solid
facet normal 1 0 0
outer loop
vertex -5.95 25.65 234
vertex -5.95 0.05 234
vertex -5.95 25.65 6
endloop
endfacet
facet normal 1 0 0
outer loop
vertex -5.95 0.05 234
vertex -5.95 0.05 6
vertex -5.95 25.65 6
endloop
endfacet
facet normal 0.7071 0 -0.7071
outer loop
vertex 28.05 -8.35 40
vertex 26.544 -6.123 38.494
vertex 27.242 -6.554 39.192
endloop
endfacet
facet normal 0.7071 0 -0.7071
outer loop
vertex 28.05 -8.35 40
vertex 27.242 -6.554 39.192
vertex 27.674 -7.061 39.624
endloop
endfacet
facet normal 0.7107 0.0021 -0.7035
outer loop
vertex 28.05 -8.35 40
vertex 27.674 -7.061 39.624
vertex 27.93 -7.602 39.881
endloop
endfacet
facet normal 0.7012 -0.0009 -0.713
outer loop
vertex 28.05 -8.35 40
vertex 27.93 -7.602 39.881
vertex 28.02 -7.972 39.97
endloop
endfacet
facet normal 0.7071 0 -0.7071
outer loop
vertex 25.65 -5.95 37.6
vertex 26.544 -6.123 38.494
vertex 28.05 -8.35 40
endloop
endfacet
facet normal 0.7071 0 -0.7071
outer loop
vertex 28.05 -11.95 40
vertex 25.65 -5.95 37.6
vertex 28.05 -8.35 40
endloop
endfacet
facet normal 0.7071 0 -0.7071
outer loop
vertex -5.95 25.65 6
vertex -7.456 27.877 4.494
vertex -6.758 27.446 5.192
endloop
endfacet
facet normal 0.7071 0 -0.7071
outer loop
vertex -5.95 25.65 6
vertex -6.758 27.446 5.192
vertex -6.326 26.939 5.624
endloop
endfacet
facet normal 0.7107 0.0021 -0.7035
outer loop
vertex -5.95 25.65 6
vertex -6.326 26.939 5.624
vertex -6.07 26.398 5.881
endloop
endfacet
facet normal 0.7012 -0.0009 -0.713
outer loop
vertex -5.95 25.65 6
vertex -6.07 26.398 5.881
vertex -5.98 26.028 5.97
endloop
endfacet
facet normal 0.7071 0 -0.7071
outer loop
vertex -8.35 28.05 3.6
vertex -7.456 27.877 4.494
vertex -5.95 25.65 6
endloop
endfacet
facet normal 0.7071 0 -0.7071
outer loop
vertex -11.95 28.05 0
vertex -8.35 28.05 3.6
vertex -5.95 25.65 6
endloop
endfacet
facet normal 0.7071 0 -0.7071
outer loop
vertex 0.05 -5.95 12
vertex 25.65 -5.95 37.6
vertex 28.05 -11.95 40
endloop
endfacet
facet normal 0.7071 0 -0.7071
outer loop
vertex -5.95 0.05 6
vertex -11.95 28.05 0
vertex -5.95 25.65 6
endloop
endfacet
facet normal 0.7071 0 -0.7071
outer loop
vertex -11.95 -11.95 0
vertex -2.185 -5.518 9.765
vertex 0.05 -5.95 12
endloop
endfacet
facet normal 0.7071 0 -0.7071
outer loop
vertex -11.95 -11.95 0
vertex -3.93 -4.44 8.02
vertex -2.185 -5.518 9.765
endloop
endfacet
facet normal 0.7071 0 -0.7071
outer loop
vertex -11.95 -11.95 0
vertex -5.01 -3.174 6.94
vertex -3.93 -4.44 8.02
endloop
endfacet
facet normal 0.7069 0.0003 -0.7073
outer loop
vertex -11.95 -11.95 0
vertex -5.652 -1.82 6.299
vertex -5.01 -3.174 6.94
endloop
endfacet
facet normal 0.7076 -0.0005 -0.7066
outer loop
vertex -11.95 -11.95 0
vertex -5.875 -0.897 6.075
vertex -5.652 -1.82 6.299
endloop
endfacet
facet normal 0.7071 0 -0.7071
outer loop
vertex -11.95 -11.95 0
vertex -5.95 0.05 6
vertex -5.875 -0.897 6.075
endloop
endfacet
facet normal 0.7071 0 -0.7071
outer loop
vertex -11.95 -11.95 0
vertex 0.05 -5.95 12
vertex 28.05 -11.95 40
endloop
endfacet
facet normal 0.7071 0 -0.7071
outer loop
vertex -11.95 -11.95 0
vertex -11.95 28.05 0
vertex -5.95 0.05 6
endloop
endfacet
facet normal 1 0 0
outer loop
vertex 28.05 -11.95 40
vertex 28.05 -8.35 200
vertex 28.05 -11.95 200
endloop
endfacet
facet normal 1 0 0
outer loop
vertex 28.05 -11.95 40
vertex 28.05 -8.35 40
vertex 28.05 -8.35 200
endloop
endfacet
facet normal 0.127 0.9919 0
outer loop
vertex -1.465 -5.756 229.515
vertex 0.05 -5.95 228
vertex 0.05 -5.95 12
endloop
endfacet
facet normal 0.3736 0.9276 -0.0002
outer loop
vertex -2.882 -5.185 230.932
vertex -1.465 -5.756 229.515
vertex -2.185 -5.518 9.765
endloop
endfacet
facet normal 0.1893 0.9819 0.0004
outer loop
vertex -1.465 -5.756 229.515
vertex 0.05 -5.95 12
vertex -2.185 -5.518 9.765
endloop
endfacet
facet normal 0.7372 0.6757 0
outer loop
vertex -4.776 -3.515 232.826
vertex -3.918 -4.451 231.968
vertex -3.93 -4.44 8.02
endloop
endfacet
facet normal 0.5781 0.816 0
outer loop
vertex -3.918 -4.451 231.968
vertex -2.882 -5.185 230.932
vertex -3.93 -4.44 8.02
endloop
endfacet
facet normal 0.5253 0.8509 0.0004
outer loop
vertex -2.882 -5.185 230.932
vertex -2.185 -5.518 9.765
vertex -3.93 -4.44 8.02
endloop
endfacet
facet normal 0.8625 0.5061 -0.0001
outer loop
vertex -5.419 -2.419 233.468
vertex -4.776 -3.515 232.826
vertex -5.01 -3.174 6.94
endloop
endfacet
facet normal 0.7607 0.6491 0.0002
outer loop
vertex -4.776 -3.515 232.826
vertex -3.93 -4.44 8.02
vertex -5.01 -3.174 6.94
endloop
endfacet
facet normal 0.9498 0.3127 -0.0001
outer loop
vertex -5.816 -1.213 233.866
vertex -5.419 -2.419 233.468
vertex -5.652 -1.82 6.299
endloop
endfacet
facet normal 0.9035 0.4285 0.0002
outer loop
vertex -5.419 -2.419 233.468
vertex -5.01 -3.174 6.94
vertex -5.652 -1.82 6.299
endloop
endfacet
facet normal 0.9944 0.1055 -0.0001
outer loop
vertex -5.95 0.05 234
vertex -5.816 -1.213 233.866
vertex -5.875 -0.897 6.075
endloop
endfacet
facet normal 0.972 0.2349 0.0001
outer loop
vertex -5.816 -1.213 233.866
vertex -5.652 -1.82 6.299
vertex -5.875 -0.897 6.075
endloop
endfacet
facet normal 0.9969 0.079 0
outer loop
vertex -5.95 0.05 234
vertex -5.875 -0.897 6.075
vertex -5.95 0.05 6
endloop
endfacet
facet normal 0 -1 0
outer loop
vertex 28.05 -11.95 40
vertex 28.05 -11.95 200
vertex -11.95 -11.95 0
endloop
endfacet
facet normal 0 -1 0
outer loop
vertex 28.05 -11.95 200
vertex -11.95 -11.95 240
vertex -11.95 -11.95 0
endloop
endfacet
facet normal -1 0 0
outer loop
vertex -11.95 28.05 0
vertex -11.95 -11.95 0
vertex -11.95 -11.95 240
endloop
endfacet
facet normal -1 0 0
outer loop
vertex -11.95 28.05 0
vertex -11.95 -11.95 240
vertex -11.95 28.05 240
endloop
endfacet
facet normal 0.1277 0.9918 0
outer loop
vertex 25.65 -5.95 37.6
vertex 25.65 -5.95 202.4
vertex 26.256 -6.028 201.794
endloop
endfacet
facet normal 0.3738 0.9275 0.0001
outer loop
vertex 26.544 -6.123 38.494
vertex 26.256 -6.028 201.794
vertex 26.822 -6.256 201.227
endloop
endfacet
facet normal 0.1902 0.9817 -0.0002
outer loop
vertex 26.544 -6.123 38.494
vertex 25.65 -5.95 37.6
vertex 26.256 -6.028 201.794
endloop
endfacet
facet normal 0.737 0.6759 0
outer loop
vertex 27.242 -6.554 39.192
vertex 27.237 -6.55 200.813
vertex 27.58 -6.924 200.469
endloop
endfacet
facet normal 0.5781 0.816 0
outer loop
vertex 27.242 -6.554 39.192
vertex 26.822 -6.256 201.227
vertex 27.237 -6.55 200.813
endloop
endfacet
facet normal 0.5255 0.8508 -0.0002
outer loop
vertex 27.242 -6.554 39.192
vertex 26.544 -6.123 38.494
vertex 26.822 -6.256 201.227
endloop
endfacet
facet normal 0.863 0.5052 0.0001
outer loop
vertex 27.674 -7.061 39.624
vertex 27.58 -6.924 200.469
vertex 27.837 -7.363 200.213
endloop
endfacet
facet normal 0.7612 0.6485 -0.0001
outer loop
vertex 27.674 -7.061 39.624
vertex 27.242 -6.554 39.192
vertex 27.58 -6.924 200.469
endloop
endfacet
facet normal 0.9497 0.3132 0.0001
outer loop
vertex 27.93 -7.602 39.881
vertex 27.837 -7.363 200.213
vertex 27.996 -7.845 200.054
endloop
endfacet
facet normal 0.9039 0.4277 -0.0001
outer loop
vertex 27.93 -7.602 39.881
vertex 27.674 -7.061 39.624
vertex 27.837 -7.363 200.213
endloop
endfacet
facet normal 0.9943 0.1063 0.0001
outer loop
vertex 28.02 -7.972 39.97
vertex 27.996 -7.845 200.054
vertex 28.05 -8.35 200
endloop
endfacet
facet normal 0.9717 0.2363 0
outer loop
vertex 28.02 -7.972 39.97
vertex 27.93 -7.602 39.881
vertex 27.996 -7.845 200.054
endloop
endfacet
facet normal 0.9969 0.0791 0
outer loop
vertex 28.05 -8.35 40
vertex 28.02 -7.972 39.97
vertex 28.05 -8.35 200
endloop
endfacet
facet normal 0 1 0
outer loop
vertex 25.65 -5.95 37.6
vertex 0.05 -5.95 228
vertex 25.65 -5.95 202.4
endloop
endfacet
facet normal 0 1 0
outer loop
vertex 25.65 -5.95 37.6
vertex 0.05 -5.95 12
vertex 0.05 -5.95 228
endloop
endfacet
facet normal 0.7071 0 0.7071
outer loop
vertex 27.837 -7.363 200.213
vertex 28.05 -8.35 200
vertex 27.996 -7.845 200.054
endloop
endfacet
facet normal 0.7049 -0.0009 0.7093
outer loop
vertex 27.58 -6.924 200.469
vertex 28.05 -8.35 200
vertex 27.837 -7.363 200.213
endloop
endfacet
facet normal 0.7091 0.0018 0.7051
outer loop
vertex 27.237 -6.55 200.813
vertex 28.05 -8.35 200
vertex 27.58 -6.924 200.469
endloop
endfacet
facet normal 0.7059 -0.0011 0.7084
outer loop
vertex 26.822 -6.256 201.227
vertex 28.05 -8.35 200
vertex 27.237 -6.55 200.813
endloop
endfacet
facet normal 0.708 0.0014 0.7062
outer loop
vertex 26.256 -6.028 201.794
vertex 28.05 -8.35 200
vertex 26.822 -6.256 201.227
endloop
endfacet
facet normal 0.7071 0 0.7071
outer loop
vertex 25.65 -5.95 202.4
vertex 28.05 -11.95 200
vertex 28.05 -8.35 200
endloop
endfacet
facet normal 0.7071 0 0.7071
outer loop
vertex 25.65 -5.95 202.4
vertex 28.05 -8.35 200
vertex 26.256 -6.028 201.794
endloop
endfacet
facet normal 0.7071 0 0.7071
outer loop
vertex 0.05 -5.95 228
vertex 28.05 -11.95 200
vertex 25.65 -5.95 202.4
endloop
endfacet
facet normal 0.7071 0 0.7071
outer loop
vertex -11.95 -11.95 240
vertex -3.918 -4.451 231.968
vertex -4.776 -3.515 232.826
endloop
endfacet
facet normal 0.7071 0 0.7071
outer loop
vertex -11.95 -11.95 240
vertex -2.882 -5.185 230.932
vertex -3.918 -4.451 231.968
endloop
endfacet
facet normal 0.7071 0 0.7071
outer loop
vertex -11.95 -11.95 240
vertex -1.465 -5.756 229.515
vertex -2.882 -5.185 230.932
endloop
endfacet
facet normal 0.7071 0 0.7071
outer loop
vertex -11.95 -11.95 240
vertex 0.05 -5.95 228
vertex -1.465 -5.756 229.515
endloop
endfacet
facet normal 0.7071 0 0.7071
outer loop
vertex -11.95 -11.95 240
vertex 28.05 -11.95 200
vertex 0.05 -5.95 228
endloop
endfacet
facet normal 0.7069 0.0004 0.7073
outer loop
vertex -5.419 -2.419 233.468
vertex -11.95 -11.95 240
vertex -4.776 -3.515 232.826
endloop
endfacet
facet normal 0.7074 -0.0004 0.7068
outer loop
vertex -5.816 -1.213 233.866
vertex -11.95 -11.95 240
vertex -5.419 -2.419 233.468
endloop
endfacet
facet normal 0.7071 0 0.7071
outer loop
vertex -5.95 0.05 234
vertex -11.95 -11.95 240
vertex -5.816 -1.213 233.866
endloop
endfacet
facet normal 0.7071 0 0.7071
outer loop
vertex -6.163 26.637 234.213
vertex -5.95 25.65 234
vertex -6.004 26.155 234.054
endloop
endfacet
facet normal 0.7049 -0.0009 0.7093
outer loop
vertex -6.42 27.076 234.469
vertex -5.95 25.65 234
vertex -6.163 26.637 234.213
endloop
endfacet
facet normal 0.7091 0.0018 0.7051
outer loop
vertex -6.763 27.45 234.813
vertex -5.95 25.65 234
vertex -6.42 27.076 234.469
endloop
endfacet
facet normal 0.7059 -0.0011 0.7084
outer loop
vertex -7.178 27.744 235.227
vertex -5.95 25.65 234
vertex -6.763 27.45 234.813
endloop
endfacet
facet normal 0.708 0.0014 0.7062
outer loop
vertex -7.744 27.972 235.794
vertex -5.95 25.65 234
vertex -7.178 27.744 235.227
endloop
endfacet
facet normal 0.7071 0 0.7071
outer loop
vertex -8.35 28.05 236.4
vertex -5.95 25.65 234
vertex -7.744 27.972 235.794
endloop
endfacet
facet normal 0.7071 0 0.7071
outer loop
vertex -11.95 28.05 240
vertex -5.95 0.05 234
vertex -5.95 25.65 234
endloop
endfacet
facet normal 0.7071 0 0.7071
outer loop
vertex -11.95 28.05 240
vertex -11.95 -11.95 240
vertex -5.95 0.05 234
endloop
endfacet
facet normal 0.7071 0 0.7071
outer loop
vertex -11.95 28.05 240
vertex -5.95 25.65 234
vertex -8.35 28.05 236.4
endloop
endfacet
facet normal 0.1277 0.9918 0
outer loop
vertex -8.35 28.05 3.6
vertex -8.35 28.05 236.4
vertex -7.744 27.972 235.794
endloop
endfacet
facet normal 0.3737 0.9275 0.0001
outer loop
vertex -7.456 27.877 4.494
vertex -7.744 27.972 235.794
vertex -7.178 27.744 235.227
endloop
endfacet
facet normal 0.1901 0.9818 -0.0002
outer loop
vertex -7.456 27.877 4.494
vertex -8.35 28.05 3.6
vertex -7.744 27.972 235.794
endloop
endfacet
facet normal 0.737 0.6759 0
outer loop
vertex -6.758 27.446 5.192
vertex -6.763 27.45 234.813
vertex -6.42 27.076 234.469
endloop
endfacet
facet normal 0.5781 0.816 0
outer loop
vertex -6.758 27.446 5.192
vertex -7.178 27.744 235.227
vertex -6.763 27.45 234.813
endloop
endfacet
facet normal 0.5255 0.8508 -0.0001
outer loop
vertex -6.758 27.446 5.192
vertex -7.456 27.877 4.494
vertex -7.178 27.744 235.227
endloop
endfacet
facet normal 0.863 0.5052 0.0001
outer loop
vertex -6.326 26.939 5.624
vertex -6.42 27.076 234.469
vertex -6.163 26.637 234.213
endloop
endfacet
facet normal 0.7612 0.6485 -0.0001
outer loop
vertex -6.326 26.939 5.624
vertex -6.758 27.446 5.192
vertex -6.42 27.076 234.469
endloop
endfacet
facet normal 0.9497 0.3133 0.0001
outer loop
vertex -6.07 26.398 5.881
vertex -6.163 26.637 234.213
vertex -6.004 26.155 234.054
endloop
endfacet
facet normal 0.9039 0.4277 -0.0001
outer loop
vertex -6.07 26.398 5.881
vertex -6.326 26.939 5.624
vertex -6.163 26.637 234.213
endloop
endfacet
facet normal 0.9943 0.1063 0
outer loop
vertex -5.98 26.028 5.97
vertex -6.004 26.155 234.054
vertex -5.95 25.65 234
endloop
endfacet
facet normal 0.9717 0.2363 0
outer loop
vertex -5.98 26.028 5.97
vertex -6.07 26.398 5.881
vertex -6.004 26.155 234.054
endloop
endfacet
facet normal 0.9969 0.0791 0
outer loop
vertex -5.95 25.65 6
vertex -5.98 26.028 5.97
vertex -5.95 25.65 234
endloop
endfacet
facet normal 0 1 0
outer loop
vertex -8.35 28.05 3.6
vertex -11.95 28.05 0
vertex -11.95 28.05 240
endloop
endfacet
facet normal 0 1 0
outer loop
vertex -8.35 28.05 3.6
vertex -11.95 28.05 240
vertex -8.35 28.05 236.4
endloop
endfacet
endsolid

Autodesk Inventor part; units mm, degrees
ref_plane "Start Plane" through (0, 0, 0) normal (0, 0, 1) x (1, 0, 0)
ref_plane "End Plane" through (0, 0, 240) normal (0, 0, 1) x (1, 0, 0)
sketch "Sketch" plane through (0, 0, 0) normal (0, 0, 1) x (1, 0, 0)
  line L0 (-5.9502, 0.0498) -> (-5.9502, 25.6498)
  line L1 (-11.9502, 28.0498) -> (-8.3502, 28.0498)
  line L2 (-11.9502, -11.9502) -> (-11.9502, 28.0498)
  line L3 (-11.9502, -11.9502) -> (28.0498, -11.9502)
  line L4 (28.0498, -8.3502) -> (28.0498, -11.9502)
  line L5 (0.0498, -5.9502) -> (25.6498, -5.9502)
  arc A0 (-5.9502, 0.0498) -> (0.0498, -5.9502) centre (0.0498, 0.0498) ccw
  arc A1 (-5.9502, 25.6498) -> (-8.3502, 28.0498) centre (-8.3502, 25.6498) ccw
  arc A2 (28.0498, -8.3502) -> (25.6498, -5.9502) centre (25.6498, -8.3502) ccw
  line L6 (0, 36.6463) -> (0, -20.0496) construction
  line L7 (-20.0496, 0) -> (36.6463, 0) construction
  point P0 (-5.9502, -5.9502)
  point P1 (-5.9502, 28.0498)
  point P2 (28.0498, -5.9502)
  dimension "d4" = 40
  dimension "d6" = 40
  dimension "d8" = 6
  dimension "d10" = 6
  dimension "d17" = 6
  dimension "d18" = 2.4
  dimension "d19" = 11.9502
  dimension "d20" = 11.9502
extrude "Body" add sketch "Sketch" along normal up to surface (240 mm away) from surface at 0
sketch "Sketch3" plane through (0, 0, 0) normal (0, 0, 1) x (1, 0, 0)
  line L0 (0, 0) -> (10, 0)
ref_plane "Work Plane10" through (0, 0, 0) normal (0, -1, 0) x (1, 0, 0)
sketch "Sketch4" plane through (0, 0, 0) normal (0, -1, 0) x (1, 0, 0)
  line L0 (-2, 0) -> (12, 0)
  line L1 (-2, 240) -> (12, 240)
  dimension "d24" = 240
ref_plane "Work Plane11" through (-11.9502, 8.0498, 240) normal (0.7071, 0, 0.7071) x (0.7071, 0, -0.7071)
split "Split1" plane through (-11.9502, 8.0498, 240) removes the side toward (0.7071, 0, 0.7071)
ref_plane "Work Plane12" through (-11.9502, 8.0498, 0) normal (0.7071, 0, -0.7071) x (-0.7071, 0, -0.7071)
split "Split2" plane through (-11.9502, 8.0498, 0) removes the side toward (0.7071, 0, -0.7071)
equation "\"d4\" = b"
equation "\"d6\" = b"
equation "\"d8\" = ParT"
equation "\"d10\" = ParT"
equation "\"d17\" = R"
equation "\"d18\" = R1"
equation "\"d19\" = ex"
equation "\"d20\" = d19"
equation "\"d11\" = G_L"
equation "\"b\" = 40"
equation "\"ParT\" = 6"
equation "\"R\" = 6"
equation "\"R1\" = 2.4"
equation "\"G_L\" = d24"
equation "\"G_OFFSET_START\" = 0"
equation "\"G_OFFSET_END\" = 0"
equation "\"ex\" = 11.950185"
properties part number "BS 4848 - 40x40x6-240" material "Steel, Mild"
